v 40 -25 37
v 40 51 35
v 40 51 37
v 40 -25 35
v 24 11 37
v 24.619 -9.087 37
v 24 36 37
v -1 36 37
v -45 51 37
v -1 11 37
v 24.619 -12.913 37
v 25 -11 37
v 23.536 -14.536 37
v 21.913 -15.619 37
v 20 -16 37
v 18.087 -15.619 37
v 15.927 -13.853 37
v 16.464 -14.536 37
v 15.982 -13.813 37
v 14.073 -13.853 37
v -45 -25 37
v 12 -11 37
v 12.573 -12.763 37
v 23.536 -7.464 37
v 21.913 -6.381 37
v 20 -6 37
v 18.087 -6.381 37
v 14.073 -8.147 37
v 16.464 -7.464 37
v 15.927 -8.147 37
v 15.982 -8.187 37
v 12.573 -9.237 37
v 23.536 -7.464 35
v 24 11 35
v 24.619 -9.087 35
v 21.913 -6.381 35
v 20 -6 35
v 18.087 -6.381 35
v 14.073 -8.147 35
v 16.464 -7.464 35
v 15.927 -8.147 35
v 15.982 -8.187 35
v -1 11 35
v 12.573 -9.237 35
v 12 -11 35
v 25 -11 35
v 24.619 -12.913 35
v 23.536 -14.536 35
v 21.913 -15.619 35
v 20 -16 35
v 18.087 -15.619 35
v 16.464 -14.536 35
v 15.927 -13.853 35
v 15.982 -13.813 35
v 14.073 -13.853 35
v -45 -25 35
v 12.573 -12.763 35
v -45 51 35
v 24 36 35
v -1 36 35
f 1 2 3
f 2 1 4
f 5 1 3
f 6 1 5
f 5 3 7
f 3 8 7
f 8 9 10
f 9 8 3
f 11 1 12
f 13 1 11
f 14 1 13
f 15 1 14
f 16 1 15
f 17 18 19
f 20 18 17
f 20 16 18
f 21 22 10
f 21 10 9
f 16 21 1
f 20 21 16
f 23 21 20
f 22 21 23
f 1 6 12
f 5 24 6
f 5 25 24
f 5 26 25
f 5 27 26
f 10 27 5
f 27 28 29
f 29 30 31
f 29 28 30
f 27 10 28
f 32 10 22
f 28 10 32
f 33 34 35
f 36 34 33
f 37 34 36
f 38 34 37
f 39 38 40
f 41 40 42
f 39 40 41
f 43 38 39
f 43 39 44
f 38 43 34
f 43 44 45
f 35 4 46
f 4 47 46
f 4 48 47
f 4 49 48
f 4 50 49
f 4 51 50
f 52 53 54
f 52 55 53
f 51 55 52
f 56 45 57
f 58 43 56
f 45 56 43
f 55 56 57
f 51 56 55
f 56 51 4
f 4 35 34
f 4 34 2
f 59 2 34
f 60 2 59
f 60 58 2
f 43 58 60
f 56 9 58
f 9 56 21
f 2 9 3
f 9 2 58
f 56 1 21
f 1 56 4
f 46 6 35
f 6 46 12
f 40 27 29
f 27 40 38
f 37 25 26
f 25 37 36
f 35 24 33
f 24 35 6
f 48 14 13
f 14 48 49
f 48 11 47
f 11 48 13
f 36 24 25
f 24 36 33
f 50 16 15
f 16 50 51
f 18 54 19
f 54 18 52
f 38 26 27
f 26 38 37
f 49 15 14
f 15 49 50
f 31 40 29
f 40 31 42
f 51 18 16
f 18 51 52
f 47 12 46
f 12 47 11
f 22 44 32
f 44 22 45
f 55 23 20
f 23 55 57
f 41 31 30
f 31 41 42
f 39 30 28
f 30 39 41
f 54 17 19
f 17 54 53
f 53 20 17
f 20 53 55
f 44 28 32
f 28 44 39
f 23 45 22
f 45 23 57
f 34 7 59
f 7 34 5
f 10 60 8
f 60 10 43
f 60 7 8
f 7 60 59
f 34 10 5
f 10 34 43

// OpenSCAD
module mount (){
	difference(){
		import("gnss_mount.stl", convexity=6);
		translate([-30,-30,0])cube([60,64,20]);
	}
}

module cover (){
	import("gnss_cover.stl", convexity=6);
}

module meatball (){
	import("meatball.stl", convexity=9);
}

module spacer (){
	import("gnss_spacer.stl", convexity=6);
}

module Pitot_bottom (){
	import("Pitot_bottom.stl", convexity=9);
}

module Pitot_cutout (){
	import("Pitot_cutout.stl", convexity=6);
}

module Pitot_top (){
	import("Pitot_top.stl", convexity=6);
}

module plate(){ //top plate
	
	difference(){ //holes into cover
		cube([85,76,2]);
		translate([65,14,-0.5])cylinder(h=3,r=5);
		translate([65-5,14,-0.5])cylinder(h=3,r=3);
		translate([44,36,-0.5])cube([25,25,3]);
		//translate([50,32,-0.5])cube([17,17,1]);
	}

}

h = 50;
w = 60;

module mount2(){
		
		depth = 22;
		difference(){
			cube([h,w,depth]);
			translate([3,3,3])cube([h-6,w-6,depth]);
			translate([24,28,-1])cylinder(h=6,r=4);
		}
}
/*
translate([27,2,15])polyhedron(
  points=[ [0,w/2,12], //0
			[0,w/2,-10], //1
			[0,-w/2,-10], //2
			[0,-w/2,12], //3 the four points at base the apex point 
             [20,w/2,-10], //4 
			[20,-w/2,-10]],//5 
  	faces=[ [0,1,2,3],[0,1,4],[2,3,5],           // each triangle side
            [1,2,4,5],[2,3,5,4],[0,3,5,4] ]           // two triangles for square base
 );
*/
//translate([-23,-28, 5])mount2();
translate([-45,-25,35])plate();

// //translate([-30,30,-20]) rotate([90,0,0]) scale([1.2,1.2,1.2]) mount();
// //rotate([-90,0,90]) translate([-40,-40,-40])cover();

//rotate([-90,180,0]) translate([-25,-65,-16])scale([1.2,1.2,1.2])spacer();

//rotate([0,0,-90]) translate([15,33,80]) scale([1.1,1.1,1.1])Pitot_bottom();
//rotate([0,0,-90]) translate([15,39,80]) Pitot_top();	

//rotate([0,0,-90]) translate([0,-23,35])scale([.3,.3,.2]) meatball();
